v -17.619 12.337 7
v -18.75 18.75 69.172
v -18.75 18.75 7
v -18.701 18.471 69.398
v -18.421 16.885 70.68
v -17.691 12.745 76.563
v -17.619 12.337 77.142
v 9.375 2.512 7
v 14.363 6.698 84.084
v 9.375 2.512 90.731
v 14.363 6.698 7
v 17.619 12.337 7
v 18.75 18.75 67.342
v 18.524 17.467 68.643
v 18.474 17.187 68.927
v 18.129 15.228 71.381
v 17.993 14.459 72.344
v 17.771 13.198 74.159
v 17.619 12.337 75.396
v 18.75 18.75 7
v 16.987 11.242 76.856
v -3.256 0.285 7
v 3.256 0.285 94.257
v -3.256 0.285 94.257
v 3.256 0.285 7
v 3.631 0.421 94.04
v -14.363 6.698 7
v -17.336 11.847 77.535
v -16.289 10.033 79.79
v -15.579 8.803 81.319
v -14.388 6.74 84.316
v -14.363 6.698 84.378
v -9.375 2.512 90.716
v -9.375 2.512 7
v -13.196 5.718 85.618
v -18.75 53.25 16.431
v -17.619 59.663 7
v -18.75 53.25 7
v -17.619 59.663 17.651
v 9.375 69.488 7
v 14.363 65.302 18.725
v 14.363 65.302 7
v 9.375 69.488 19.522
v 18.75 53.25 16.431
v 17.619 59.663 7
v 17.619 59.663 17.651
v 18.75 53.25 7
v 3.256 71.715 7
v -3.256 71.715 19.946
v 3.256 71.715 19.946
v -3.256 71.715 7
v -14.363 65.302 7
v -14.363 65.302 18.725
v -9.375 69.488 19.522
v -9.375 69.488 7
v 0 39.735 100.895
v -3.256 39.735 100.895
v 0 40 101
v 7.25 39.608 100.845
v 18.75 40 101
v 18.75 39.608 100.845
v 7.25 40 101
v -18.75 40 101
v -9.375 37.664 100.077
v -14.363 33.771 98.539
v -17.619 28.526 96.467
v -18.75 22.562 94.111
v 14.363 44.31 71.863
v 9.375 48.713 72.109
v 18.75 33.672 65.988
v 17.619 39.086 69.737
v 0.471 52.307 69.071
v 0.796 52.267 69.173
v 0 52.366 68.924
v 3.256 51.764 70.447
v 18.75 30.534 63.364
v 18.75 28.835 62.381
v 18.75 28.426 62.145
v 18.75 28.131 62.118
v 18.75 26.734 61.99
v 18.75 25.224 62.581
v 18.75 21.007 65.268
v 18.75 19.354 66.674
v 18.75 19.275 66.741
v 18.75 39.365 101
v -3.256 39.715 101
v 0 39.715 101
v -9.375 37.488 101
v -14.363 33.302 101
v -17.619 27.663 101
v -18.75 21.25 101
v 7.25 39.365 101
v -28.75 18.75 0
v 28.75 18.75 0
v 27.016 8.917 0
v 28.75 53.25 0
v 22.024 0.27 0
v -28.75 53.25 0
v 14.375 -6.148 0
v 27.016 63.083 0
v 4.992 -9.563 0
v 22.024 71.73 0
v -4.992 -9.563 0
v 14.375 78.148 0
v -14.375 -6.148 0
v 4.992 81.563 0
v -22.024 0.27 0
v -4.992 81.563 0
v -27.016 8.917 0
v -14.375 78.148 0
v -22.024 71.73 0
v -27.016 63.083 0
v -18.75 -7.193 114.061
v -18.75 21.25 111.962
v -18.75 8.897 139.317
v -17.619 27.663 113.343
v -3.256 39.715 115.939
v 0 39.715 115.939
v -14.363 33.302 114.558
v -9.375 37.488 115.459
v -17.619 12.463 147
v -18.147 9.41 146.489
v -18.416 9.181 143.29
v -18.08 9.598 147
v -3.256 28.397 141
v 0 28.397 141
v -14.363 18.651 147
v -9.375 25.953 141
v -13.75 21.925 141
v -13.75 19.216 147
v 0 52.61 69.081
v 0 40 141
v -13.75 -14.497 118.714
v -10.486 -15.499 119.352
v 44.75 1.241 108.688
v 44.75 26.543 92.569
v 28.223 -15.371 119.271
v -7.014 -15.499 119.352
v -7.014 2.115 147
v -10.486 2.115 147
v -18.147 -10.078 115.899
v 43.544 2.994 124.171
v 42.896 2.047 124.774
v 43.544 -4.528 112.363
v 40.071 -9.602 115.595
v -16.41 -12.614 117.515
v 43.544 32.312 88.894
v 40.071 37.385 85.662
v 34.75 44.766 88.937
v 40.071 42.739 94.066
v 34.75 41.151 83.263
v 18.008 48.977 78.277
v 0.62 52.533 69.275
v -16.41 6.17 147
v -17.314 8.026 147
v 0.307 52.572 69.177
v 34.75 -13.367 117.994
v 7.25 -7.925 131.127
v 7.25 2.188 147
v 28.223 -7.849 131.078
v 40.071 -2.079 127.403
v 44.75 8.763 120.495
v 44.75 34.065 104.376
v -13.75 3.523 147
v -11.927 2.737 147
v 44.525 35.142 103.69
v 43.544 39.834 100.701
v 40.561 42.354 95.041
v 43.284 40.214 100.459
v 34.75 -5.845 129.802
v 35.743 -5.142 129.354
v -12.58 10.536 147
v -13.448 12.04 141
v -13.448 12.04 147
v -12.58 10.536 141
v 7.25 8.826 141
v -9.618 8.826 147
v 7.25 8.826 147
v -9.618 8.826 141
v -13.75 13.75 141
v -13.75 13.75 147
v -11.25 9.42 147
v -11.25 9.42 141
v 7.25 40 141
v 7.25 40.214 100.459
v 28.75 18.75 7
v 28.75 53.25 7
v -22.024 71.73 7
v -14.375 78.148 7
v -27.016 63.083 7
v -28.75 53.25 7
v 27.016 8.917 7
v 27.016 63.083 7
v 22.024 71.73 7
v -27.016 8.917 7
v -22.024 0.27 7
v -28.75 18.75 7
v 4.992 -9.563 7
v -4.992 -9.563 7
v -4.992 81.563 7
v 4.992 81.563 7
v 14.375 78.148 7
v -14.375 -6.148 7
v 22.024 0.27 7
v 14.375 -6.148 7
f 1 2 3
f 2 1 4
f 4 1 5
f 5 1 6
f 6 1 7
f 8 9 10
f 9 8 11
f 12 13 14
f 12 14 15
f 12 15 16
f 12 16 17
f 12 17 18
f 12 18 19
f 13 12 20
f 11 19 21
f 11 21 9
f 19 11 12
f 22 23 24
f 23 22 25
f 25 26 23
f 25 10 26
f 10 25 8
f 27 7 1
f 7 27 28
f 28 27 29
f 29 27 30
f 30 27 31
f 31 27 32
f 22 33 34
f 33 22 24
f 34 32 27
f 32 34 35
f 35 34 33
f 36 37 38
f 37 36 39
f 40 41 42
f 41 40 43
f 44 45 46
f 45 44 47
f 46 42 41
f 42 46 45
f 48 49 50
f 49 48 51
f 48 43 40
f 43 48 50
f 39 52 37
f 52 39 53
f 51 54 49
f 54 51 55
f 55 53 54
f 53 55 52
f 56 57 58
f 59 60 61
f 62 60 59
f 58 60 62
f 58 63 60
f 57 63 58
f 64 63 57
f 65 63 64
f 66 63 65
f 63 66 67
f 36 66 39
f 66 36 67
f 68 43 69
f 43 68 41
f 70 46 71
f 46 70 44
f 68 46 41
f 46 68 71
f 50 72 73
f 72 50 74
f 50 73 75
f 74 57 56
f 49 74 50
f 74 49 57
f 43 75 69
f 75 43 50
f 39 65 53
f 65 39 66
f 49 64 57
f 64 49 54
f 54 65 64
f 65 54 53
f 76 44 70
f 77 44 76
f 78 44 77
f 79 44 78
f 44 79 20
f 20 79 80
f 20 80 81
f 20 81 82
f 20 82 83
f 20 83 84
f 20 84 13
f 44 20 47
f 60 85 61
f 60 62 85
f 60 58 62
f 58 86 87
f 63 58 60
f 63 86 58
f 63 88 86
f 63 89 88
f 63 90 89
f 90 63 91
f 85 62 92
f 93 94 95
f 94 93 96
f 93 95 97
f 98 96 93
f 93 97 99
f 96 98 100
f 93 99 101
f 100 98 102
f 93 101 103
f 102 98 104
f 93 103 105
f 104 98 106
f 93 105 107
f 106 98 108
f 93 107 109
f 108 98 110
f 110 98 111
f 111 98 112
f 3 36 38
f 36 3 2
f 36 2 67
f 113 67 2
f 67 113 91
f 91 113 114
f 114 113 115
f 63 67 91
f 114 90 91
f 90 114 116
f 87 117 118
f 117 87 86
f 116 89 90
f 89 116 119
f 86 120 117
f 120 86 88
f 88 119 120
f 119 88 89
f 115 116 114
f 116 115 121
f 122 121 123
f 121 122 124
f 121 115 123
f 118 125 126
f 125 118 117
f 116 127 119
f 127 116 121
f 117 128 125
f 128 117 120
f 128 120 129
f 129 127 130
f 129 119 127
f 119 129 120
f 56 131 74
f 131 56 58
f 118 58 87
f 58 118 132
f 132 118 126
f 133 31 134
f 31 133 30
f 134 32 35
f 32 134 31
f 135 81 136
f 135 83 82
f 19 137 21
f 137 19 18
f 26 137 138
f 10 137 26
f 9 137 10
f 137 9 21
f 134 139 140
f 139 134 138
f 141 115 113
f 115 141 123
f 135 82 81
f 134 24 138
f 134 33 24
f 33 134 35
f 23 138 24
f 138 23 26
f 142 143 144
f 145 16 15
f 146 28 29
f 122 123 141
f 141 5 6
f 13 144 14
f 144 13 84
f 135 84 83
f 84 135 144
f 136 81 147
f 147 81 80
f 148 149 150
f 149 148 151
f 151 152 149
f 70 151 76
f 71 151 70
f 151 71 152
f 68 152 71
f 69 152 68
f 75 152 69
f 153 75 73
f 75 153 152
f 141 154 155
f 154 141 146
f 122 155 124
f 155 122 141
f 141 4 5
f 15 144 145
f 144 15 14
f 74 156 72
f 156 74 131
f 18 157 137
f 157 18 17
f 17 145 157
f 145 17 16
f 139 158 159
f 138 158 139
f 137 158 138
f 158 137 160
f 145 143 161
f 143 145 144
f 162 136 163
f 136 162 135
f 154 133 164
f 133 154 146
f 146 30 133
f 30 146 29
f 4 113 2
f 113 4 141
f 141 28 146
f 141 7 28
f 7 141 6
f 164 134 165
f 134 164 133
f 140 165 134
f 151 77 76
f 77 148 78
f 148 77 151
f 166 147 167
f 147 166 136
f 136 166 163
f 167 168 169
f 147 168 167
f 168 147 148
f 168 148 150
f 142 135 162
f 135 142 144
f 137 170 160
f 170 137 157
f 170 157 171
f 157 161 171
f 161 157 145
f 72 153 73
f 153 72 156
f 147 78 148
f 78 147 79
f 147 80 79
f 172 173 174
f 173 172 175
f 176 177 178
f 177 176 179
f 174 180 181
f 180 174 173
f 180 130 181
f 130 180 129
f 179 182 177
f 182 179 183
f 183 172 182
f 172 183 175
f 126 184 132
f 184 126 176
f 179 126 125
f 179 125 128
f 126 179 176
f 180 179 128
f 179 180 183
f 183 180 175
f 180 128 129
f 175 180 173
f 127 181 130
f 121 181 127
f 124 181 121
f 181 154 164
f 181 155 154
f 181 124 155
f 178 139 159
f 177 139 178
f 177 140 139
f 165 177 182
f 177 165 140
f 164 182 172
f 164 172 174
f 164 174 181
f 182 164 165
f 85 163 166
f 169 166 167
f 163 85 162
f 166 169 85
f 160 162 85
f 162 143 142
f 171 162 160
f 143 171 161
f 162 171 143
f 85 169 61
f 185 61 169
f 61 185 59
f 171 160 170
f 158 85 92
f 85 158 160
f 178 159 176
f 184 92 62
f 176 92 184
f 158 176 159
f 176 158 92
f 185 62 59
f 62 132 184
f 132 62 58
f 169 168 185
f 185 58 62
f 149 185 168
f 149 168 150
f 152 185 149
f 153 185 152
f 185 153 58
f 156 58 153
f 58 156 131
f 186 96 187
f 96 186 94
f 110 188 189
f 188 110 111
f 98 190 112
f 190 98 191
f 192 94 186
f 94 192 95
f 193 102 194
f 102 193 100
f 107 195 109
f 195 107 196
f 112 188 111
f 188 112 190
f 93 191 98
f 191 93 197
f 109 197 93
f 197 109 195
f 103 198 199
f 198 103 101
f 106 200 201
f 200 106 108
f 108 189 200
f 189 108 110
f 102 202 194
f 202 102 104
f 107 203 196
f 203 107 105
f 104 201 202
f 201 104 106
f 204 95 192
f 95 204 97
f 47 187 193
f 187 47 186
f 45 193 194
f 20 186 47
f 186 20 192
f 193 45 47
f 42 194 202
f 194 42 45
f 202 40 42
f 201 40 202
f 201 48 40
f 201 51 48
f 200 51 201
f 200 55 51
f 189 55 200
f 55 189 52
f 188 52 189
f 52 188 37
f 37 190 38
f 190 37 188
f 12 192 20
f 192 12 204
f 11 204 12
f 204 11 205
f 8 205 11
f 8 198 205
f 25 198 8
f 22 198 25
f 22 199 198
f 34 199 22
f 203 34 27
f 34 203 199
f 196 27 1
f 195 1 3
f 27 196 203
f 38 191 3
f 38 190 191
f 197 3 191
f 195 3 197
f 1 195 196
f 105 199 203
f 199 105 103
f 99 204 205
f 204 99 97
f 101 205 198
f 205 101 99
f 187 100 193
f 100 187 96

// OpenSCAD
$fn=18;

hull() {
    translate([0,37.5/2,0]) cylinder(r=37.5/2+10,h=7);
    translate([0,72-37.5/2,0]) cylinder(r=37.5/2+10,h=7);
}

difference() {
    translate([-37.5/2,0,0]) cube([37.5,72,101]);
    
    translate([0,0,-1]) linear_co_v(37.5/2,200);
    
    translate([0,72,-1]) mirror([0,1,0]) linear_co_v(37.5/2,200);
    
    translate([0,72,20]) rotate([atan((72-40)/(101-20)),0,0]) mirror([0,1,0]) linear_co_v(37.5/2,sqrt(pow(72-40,2)+pow(101-20,2)));
    
    translate([0,40,101]) spindle_co(0,37.5/2);
}

*translate([0,37.5/2,0]) cylinder(r=37.5/2,h=147);
*translate([0,72-37.5/2,0]) cylinder(r=37.5/2,h=20);

*translate([0,72,20]) rotate([atan((72-40)/(101-20)),0,0]) translate([0,-37.5/2,0]) cylinder(r=37.5/2,h=sqrt(pow(72-40,2)+pow(101-20,2)));

*translate([0,40-37.5/2,101]) cylinder(r=37.5/2,h=15);

*translate([0,40,116]) rotate([atan((40-26)/(31)),0,0]) translate([0,-37.5/2,0]) cylinder(r=37.5/2,h=sqrt(pow(40-26,2)+pow(31,2)));

ah_ow = 71-7.5;

difference() {
    translate([-37.5/2,-21,111]) rotate([-32.5,0,0]) hull() {
        translate([0,0,10]) {
            *translate([0,12,0]) cube([12,70-12,75]);
            *translate([0,20,0]) cube([ah_ow,70-20-20,75]);
            *translate([12,0,0]) cube([ah_ow-12-20,70,75]);
            
            translate([10,10,0]) cylinder(r=10,h=75);
            
            translate([10,70+20-10,0]) cylinder(r=10,h=75);
            
            translate([ah_ow-20,20,0]) cylinder(r=20,h=75);
            
            translate([ah_ow-20,70-20,0]) cylinder(r=20,h=75);
        }
            
        
        #translate([37.5-5,70-5,-ah_ow+37.5+10]) cylinder(r=5,h=10);
        #translate([37.5-5,70-5-5,-ah_ow+37.5+10]) cylinder(r=5,h=10);
        #translate([5,70-5-5,-ah_ow+37.5+10]) cylinder(r=5,h=10);

    }
    
    hull() {
        translate([-37.5/2+10,37.5/2-5,157-16]) cylinder(r=5,h=50);
        translate([-37.5/2+10+50,37.5/2-5,157-16]) cylinder(r=5,h=50);
        translate([-37.5/2+10,37.5/2-5+50,157-16]) cylinder(r=5,h=50);
    }
    
    translate([-50,-50,147]) cube([100,200,100]);
    
    translate([-37.5/2+26,-21,111]) rotate([-32.5,0,0]) translate([0,-10,24]) cube([71,100,100]);
    
    translate([-50,40,101]) cube([100,100,100]);
    translate([0,40,101]) rotate([atan((72-40)/(101-20)),0,0]) translate([-50,0,-100]) cube([100,100,100]);
    
    difference() {
        union() {
            translate([0,72,20]) rotate([atan((72-40)/(101-20)),0,0]) mirror([0,1,0]) linear_co_v(37.5/2,sqrt(pow(72-40,2)+pow(101-20,2)));
            translate([0,40,101]) spindle_co(0,37.5/2);
            translate([0,40,101]) mirror([0,1,0]) linear_co_v(37.5/2,200);
            
            translate([0,40,116]) rotate([atan((40-26)/(31)),0,0]) mirror([0,1,0]) linear_co_v(37.5/2,200);
        }
        cube([100,100,200]);
    }
}


*piv_base();
*for(i=[0:3]) rotate([0,0,i*90]) translate([4,8,-20]) ms();
*rotate([0,sin($t*360)*atan((20.8-18.3)/20),0]) {
    piv_out();
    rotate([sin($t*360+90)*atan((20.8-18.3)/20),0,0]) piv_in();
}

*translate([0,0,-(-20+10.3/2)]) piv_base();
*translate([50,10,8]) rotate([0,0,90]) rotate([0,90,0]) piv_in();
*translate([90,0,8]) rotate([0,180,0]) piv_out();


module ms() translate([-27.7-8.8,20.8-10.4,-10.3/2]) {
    difference() {
        hull() {
            cylinder(r=2.75,h=10.3);
            translate([22.2,0,0]) cylinder(r=2.75,h=10.3);
            translate([0,10.4,0]) cylinder(r=2.75,h=10.3);
            translate([22.2,10.4,0]) cylinder(r=2.75,h=10.3);
        }
        translate([0,0,-1]) cylinder(r=1.5,h=20);
        translate([22.2,10.4,-1]) cylinder(r=1.5,h=20);
    }
    translate([8.8+1,-18.3+10.4,(10.3-5)/2]) rotate([0,0,-atan((20.8-18.3)/27.8)]) {
        cube([27.8-1,2,5]);
        translate([0,1,0]) cylinder(r=1,h=5);
        translate([27.7-1,1,0]) cylinder(r=1,h=5);
        translate([-1,1,0]) cube([2,10,5]);
    }
        
}
module ms_co() translate([-27.7-8.8,20.8-10.4,-10.3/2]) {
    hull() {
        translate([0,0,-4]) cylinder(r=0.5,h=10.3+8);
        translate([0,0,-4+1]) cylinder(r=1.5,h=10.3+6);
    }
    translate([22.2,10.4,0]) hull() {
        translate([0,0,-4]) cylinder(r=0.5,h=10.3+8);
        translate([0,0,-4+1]) cylinder(r=1.5,h=10.3+6);
    }
}




module piv_base() difference() {
    hull() for(i=[0,1]) mirror([i,0,0]) for(j=[0,1]) mirror([0,j,0])
        translate([8+16+4,8+16+8,-20+10.3/2]) cylinder(r=8,h=20-10.3/2+8);
    
    hull() for(i=[0,1]) mirror([i,0,0]) for(j=[0,1]) mirror([0,j,0])
        translate([8+16+4-2,8+16+8-2+0.25,-8-1]) cylinder(r=2,h=100);
    
    hull() for(i=[0,1]) mirror([i,0,0]) for(j=[0,1]) mirror([0,j,0])
        translate([16-4,16-4,-50]) cylinder(r=4,h=100);
    
    translate([0,50,0]) rotate([90,0,0]) hull() {
        cylinder(r=2+0.25,h=100);
        rotate([0,0,0]) translate([-(2+0.25)*tan(22.5),-(2+0.25),0]) cube([2*(2+0.25)*tan(22.5),2*(2+0.25),100]);
    }
    
    for(i=[0,1]) mirror([0,i,0]) translate([0,8+16+8+0.75,0]) rotate([90,0,0]) cylinder(r1=6.25,r2=6.25+2,h=2);
    
    *translate([0,0,-50]) cube([100,100,100]);
    
    for(i=[0:3]) rotate([0,0,i*90]) translate([4,8,-20]) ms_co();
}

th_br = 7.5;

    
module piv_in() {
    difference() {
        union() {
            hull() {
                translate([0,0,-8-20]) cylinder(r=8,h=8+20+50);
                rotate([0,0,90]) translate([-8*tan(22.5),-8,-8-20]) cube([2*8*tan(22.5),2*8,8+20+50]);
            }
            translate([-8,0,0]) rotate([0,90,0]) cylinder(r=8,h=16);
        }
        
        translate([-25,0,0]) rotate([0,90,0]) cylinder(r=2+0.25,h=50);
    }
    translate([0,0,50]) rotate([0,90,0]) {
        for(i=[0,1]) mirror([0,i,0]) translate([0,25,0]) rotate_extrude() intersection() {
            translate([0,0]) circle(r=8*sqrt(2));
            translate([0,-8]) square([16,16]);
        }
        
        for(i=[0,1]) mirror([i,0,0]) intersection() {
            translate([(pow(25,2)+pow(8+4,2)-pow(8,2))/(2*4)-8-4,0,0]) rotate_extrude($fn=$fn*4) intersection() {
                translate([(pow(25,2)+pow(8+4,2)-pow(8,2))/(2*4)-8,0]) circle(r=8*sqrt(2),$fn=$fn/4);
                translate([0,-8]) square([100,16]);
            }
            //cylinder(r=(pow(25,2)+pow(8+4,2)-pow(8,2))/(2*4),h=16,$fn=$fn*4);
            
            translate([(pow(25,2)+pow(8+4,2)-pow(8,2))/(2*4)-8-4,0,-50]) rotate([0,0,90+atan(25/((pow(25,2)+pow(8+4,2)-pow(8,2))/(2*4)-8-4))]) cube([100,100,100]);
            mirror([0,1,0]) translate([(pow(25,2)+pow(8+4,2)-pow(8,2))/(2*4)-8-4,0,-50]) rotate([0,0,90+atan(25/((pow(25,2)+pow(8+4,2)-pow(8,2))/(2*4)-8-4))]) cube([100,100,100]);
            
            translate([-100,-50,-50]) cube([100,100,100]);
        }
    }
}

module piv_out() difference() {
        union() {
            translate([0,8+16+8,0]) rotate([90,0,0]) {
                hull() {
                    cylinder(r=16,h=8+8+8,$fn=$fn*2);
                    translate([0,0,8]) cylinder(r=16+8,h=8,$fn=$fn*2);
                }
                translate([0,0,8+16+8+8]) hull() {
                    cylinder(r=16,h=8+8+8,$fn=$fn*2);
                    translate([0,0,8]) cylinder(r=16+8,h=8,$fn=$fn*2);
                }
            }
            translate([-8-8,-2-16,-8]) cube([16+16,4+32+4,16]);
        }
    
        
    translate([-50,-50,8]) cube([100,100,50]);
        
    difference() {
        translate([-50,-50,-50]) cube([100,100,50]);
        
        hull() {
            translate([0,50,0]) rotate([90,0,0]) cylinder(r=8,h=100);
            for(i=[0,1]) mirror([i,0,0]) rotate([0,-atan((20.8-18.3)/20),0]) translate([0,-50,-8]) cube([50,100,50]);
        }
    }
    
    hull() {
        translate([-8-0.25,-8-16+1.6,-10-1]) cube([16+2*0.25,16+32-3.2,20+2]);
        translate([-8-0.25+1.6,-8-16,-10-1]) cube([16+2*0.25-2.3,16+32,20+2]);
    }
    
    translate([-25,0,0]) rotate([0,90,0]) hull() {
        cylinder(r=2+0.25,h=50);
        rotate([0,0,90]) translate([-(2+0.25)*tan(22.5),-(2+0.25),0]) cube([2*(2+0.25)*tan(22.5),2*(2+0.25),50]);
    }
    
    translate([0,50,0]) rotate([90,0,0]) hull() {
        cylinder(r=2+0.25,h=100);
        rotate([0,0,0]) translate([-(2+0.25)*tan(22.5),-(2+0.25),0]) cube([2*(2+0.25)*tan(22.5),2*(2+0.25),100]);
    }
    
    for(i=[0,1]) mirror([i,0,0]) translate([-8-1,0,0]) rotate([0,90,0]) cylinder(r1=6.25,r2=6.25+2,h=2);
}

*translate() hull() {
    translate([(25-th_br),(25-th_br),th_br]) sphere(r=th_br);
    translate([(25-th_br),-(25-th_br),th_br]) sphere(r=th_br);
    translate([-(25-th_br),(25-th_br),th_br]) sphere(r=th_br);
    translate([-(25-th_br),-(25-th_br),th_br]) sphere(r=th_br);
    
    translate([(25-th_br),(25-th_br),40-th_br]) sphere(r=th_br);
    translate([(25-th_br),-(25-th_br),40-th_br]) sphere(r=th_br);
    translate([-(25-th_br),(25-th_br),40-th_br]) sphere(r=th_br);
    translate([-(25-th_br),-(25-th_br),40-th_br]) sphere(r=th_br);
}

*difference() {
    translate([-12,-5,0]) cube([24,24+40,130]);
    translate([0,0,-5]) linear_co_v(12,90+5);
    translate([0,-5,90]) spindle_co(5,12);
    translate([0,-5,90]) rotate([-15,0,0]) translate([-25,-50,-25+5]) cube([50,50,100]);   
}
*difference() {
    translate([0,-5,90]) rotate([-15,0,0]) translate([0,0,5+12-50]) {
        cube([12+12,50,20+50]);
        translate([12+12,25,0]) cylinder(r=25,h=20+50);
    }
    hull() {
    #translate([-25,-5,90]) rotate([0,90,0]) cylinder(r=5+12,h=100);
    #translate([-25,-5+100,90-100*tan(15+30)]) rotate([0,90,0]) cylinder(r=5+12,h=100);
    #translate([-25,-5,0]) rotate([0,90,0]) cylinder(r=5+12,h=100);
    }
}

*translate([24,12,75]) rotate([-30,0,0]) cylinder(r=24,h=24);




module spindle_co(sp_r,co_r,squash=true,co_rd_tmp) rotate([0,90,0]) {
	co_rd = (co_rd_tmp == undef ? co_r : co_rd_tmp);
	
	*translate([0,0,-25]) cylinder(r=sp_r,h=50);
	rotate_extrude(convexity=10,$fn=$fn*pow(2,floor(ln((sp_r+co_rd)/10)/ln(2)))) difference() {
		translate([0,-25]) square([co_rd+sp_r,50]);
		
		if (squash==false) hull() {
			translate([co_rd+sp_r,co_r-co_rd]) circle(r=co_rd,$fn=$fn/pow(2,floor(ln((sp_r+co_rd)/10)/ln(2)))*pow(2,floor(ln(co_rd/10)/ln(2))));
			translate([co_rd+sp_r,-co_r+co_rd]) circle(r=co_rd,$fn=$fn/pow(2,floor(ln((sp_r+co_rd)/10)/ln(2)))*pow(2,floor(ln(co_rd/10)/ln(2))));
		} else {
			translate([co_rd+sp_r,0]) scale([co_rd/co_r,1,1]) circle(r=co_r,$fn=$fn/pow(2,floor(ln((sp_r+co_rd)/10)/ln(2)))*pow(2,floor(ln(co_r/10)/ln(2))));
		}
	}
}

module linear_co(co_r,length=150,height=150,squash=true,co_rd_tmp) translate([-25,0,0]) {
	co_rd = (co_rd_tmp == undef ? co_r : co_rd_tmp);

	*cube([50,150,150]);
	difference() {
		translate([0,0,-co_rd]) cube([50,length,height+co_rd]);
		
		if (squash==false) hull() {
			translate([25+co_r-co_rd,-10,-co_rd]) rotate([-90,0,0]) cylinder(r=co_rd,h=length+20);
			translate([25-co_r+co_rd,-10,-co_rd]) rotate([-90,0,0]) cylinder(r=co_rd,h=length+20);
		} else {
			translate([25,-10,-co_rd]) scale([1,1,co_rd/co_r]) rotate([-90,0,0]) cylinder(r=co_r,h=length+20);
		}
	}
}

module linear_co_v(co_r,length=150,height=150,squash=true,co_rd_tmp) rotate([90,0,0]) linear_co(co_r,length,height,squash,co_rd_tmp);

module torus_co(sp_r,co_r,angle=90,out_r=50,squash=true,co_rd_tmp) rotate([0,90,0]) intersection() {
        rotate_extrude(convexity=10,$fn=$fn*pow(2,floor(ln(sp_r/10)/ln(2)))) difference() {
        co_rd = (co_rd_tmp == undef ? co_r : co_rd_tmp);
    
        translate([sp_r-co_rd,-25]) square([out_r,50]);
    
        if (squash==false) hull() {
            translate([sp_r-co_rd,co_r-co_rd]) circle(r=co_rd,$fn=$fn/pow(2,floor(ln(sp_r/10)/ln(2)))*pow(2,floor(ln(co_rd/10)/ln(2))));
            translate([sp_r-co_rd,-co_r+co_rd]) circle(r=co_rd,$fn=$fn/pow(2,floor(ln(sp_r/10)/ln(2)))*pow(2,floor(ln(co_rd/10)/ln(2))));
        } else {
            translate([sp_r-co_rd,0]) scale([co_rd/co_r,1,1]) circle(r=co_r,$fn=$fn/pow(2,floor(ln(sp_r/10)/ln(2)))*pow(2,floor(ln(co_r/10)/ln(2))));
        }
    }
    translate([0,0,-25]) cube([sp_r+50,sp_r+50,50]);
    rotate([0,0,-90+angle]) translate([0,0,-25]) cube([sp_r+50,sp_r+50,50]);
}
